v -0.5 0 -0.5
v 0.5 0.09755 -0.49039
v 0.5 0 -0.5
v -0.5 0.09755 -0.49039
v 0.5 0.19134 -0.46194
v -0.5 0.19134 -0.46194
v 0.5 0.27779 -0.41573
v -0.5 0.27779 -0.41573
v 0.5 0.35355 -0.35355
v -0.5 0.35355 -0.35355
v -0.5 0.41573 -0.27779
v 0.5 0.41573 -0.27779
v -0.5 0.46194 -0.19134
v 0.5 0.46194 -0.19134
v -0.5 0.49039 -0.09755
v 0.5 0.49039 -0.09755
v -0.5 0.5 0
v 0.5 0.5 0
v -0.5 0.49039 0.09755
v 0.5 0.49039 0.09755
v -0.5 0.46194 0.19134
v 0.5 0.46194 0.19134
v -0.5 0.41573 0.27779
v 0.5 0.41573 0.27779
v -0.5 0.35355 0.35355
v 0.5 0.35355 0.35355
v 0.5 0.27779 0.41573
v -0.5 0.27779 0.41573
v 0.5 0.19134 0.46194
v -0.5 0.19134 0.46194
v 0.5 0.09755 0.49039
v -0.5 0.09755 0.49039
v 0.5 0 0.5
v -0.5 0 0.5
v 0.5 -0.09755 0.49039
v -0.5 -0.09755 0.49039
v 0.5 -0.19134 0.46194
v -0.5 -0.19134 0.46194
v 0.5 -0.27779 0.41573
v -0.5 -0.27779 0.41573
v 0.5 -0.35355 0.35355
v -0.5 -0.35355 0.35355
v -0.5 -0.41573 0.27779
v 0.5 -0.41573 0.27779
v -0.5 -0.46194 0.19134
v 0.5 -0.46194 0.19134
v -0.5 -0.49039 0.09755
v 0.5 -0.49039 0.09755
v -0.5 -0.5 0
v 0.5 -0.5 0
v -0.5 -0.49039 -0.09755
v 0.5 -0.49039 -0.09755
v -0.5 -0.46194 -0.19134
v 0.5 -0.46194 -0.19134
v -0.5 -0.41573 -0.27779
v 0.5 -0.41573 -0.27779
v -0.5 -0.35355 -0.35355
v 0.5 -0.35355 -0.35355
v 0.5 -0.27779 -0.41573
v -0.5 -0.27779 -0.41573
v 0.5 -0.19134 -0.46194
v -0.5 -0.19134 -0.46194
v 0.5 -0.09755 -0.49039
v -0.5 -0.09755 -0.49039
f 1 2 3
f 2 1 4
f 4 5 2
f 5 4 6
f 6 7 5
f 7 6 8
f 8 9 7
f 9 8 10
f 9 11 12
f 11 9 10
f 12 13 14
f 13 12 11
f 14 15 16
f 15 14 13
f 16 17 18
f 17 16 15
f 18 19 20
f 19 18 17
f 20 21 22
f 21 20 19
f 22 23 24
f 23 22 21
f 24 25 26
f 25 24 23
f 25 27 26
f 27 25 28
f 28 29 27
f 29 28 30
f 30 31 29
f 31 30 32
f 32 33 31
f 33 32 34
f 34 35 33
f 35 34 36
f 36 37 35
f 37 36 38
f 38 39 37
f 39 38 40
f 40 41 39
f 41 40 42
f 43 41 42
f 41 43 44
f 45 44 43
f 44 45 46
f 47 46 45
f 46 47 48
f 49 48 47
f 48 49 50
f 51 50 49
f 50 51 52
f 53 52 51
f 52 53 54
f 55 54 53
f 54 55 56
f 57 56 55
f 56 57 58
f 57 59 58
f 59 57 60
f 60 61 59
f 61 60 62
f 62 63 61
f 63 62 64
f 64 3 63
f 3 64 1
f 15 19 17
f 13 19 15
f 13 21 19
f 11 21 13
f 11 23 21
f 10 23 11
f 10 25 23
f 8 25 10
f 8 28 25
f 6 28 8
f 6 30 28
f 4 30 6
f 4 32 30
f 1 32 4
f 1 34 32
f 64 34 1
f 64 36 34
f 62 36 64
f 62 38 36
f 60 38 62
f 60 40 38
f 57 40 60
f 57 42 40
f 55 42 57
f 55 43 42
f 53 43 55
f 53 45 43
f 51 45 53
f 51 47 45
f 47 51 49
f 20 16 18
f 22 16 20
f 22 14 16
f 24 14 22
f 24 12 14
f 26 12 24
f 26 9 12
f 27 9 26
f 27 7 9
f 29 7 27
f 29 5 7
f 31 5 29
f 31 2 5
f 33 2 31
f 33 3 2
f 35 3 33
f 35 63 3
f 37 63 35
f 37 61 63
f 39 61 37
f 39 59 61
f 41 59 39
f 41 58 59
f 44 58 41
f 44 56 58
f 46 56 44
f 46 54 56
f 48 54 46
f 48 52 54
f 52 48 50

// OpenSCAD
$fn=32;

rotate(v = [0, 1, 0], 90)
	cylinder(h = 1.0, r1 = 0.5, r2 = 0.5, center = true);
